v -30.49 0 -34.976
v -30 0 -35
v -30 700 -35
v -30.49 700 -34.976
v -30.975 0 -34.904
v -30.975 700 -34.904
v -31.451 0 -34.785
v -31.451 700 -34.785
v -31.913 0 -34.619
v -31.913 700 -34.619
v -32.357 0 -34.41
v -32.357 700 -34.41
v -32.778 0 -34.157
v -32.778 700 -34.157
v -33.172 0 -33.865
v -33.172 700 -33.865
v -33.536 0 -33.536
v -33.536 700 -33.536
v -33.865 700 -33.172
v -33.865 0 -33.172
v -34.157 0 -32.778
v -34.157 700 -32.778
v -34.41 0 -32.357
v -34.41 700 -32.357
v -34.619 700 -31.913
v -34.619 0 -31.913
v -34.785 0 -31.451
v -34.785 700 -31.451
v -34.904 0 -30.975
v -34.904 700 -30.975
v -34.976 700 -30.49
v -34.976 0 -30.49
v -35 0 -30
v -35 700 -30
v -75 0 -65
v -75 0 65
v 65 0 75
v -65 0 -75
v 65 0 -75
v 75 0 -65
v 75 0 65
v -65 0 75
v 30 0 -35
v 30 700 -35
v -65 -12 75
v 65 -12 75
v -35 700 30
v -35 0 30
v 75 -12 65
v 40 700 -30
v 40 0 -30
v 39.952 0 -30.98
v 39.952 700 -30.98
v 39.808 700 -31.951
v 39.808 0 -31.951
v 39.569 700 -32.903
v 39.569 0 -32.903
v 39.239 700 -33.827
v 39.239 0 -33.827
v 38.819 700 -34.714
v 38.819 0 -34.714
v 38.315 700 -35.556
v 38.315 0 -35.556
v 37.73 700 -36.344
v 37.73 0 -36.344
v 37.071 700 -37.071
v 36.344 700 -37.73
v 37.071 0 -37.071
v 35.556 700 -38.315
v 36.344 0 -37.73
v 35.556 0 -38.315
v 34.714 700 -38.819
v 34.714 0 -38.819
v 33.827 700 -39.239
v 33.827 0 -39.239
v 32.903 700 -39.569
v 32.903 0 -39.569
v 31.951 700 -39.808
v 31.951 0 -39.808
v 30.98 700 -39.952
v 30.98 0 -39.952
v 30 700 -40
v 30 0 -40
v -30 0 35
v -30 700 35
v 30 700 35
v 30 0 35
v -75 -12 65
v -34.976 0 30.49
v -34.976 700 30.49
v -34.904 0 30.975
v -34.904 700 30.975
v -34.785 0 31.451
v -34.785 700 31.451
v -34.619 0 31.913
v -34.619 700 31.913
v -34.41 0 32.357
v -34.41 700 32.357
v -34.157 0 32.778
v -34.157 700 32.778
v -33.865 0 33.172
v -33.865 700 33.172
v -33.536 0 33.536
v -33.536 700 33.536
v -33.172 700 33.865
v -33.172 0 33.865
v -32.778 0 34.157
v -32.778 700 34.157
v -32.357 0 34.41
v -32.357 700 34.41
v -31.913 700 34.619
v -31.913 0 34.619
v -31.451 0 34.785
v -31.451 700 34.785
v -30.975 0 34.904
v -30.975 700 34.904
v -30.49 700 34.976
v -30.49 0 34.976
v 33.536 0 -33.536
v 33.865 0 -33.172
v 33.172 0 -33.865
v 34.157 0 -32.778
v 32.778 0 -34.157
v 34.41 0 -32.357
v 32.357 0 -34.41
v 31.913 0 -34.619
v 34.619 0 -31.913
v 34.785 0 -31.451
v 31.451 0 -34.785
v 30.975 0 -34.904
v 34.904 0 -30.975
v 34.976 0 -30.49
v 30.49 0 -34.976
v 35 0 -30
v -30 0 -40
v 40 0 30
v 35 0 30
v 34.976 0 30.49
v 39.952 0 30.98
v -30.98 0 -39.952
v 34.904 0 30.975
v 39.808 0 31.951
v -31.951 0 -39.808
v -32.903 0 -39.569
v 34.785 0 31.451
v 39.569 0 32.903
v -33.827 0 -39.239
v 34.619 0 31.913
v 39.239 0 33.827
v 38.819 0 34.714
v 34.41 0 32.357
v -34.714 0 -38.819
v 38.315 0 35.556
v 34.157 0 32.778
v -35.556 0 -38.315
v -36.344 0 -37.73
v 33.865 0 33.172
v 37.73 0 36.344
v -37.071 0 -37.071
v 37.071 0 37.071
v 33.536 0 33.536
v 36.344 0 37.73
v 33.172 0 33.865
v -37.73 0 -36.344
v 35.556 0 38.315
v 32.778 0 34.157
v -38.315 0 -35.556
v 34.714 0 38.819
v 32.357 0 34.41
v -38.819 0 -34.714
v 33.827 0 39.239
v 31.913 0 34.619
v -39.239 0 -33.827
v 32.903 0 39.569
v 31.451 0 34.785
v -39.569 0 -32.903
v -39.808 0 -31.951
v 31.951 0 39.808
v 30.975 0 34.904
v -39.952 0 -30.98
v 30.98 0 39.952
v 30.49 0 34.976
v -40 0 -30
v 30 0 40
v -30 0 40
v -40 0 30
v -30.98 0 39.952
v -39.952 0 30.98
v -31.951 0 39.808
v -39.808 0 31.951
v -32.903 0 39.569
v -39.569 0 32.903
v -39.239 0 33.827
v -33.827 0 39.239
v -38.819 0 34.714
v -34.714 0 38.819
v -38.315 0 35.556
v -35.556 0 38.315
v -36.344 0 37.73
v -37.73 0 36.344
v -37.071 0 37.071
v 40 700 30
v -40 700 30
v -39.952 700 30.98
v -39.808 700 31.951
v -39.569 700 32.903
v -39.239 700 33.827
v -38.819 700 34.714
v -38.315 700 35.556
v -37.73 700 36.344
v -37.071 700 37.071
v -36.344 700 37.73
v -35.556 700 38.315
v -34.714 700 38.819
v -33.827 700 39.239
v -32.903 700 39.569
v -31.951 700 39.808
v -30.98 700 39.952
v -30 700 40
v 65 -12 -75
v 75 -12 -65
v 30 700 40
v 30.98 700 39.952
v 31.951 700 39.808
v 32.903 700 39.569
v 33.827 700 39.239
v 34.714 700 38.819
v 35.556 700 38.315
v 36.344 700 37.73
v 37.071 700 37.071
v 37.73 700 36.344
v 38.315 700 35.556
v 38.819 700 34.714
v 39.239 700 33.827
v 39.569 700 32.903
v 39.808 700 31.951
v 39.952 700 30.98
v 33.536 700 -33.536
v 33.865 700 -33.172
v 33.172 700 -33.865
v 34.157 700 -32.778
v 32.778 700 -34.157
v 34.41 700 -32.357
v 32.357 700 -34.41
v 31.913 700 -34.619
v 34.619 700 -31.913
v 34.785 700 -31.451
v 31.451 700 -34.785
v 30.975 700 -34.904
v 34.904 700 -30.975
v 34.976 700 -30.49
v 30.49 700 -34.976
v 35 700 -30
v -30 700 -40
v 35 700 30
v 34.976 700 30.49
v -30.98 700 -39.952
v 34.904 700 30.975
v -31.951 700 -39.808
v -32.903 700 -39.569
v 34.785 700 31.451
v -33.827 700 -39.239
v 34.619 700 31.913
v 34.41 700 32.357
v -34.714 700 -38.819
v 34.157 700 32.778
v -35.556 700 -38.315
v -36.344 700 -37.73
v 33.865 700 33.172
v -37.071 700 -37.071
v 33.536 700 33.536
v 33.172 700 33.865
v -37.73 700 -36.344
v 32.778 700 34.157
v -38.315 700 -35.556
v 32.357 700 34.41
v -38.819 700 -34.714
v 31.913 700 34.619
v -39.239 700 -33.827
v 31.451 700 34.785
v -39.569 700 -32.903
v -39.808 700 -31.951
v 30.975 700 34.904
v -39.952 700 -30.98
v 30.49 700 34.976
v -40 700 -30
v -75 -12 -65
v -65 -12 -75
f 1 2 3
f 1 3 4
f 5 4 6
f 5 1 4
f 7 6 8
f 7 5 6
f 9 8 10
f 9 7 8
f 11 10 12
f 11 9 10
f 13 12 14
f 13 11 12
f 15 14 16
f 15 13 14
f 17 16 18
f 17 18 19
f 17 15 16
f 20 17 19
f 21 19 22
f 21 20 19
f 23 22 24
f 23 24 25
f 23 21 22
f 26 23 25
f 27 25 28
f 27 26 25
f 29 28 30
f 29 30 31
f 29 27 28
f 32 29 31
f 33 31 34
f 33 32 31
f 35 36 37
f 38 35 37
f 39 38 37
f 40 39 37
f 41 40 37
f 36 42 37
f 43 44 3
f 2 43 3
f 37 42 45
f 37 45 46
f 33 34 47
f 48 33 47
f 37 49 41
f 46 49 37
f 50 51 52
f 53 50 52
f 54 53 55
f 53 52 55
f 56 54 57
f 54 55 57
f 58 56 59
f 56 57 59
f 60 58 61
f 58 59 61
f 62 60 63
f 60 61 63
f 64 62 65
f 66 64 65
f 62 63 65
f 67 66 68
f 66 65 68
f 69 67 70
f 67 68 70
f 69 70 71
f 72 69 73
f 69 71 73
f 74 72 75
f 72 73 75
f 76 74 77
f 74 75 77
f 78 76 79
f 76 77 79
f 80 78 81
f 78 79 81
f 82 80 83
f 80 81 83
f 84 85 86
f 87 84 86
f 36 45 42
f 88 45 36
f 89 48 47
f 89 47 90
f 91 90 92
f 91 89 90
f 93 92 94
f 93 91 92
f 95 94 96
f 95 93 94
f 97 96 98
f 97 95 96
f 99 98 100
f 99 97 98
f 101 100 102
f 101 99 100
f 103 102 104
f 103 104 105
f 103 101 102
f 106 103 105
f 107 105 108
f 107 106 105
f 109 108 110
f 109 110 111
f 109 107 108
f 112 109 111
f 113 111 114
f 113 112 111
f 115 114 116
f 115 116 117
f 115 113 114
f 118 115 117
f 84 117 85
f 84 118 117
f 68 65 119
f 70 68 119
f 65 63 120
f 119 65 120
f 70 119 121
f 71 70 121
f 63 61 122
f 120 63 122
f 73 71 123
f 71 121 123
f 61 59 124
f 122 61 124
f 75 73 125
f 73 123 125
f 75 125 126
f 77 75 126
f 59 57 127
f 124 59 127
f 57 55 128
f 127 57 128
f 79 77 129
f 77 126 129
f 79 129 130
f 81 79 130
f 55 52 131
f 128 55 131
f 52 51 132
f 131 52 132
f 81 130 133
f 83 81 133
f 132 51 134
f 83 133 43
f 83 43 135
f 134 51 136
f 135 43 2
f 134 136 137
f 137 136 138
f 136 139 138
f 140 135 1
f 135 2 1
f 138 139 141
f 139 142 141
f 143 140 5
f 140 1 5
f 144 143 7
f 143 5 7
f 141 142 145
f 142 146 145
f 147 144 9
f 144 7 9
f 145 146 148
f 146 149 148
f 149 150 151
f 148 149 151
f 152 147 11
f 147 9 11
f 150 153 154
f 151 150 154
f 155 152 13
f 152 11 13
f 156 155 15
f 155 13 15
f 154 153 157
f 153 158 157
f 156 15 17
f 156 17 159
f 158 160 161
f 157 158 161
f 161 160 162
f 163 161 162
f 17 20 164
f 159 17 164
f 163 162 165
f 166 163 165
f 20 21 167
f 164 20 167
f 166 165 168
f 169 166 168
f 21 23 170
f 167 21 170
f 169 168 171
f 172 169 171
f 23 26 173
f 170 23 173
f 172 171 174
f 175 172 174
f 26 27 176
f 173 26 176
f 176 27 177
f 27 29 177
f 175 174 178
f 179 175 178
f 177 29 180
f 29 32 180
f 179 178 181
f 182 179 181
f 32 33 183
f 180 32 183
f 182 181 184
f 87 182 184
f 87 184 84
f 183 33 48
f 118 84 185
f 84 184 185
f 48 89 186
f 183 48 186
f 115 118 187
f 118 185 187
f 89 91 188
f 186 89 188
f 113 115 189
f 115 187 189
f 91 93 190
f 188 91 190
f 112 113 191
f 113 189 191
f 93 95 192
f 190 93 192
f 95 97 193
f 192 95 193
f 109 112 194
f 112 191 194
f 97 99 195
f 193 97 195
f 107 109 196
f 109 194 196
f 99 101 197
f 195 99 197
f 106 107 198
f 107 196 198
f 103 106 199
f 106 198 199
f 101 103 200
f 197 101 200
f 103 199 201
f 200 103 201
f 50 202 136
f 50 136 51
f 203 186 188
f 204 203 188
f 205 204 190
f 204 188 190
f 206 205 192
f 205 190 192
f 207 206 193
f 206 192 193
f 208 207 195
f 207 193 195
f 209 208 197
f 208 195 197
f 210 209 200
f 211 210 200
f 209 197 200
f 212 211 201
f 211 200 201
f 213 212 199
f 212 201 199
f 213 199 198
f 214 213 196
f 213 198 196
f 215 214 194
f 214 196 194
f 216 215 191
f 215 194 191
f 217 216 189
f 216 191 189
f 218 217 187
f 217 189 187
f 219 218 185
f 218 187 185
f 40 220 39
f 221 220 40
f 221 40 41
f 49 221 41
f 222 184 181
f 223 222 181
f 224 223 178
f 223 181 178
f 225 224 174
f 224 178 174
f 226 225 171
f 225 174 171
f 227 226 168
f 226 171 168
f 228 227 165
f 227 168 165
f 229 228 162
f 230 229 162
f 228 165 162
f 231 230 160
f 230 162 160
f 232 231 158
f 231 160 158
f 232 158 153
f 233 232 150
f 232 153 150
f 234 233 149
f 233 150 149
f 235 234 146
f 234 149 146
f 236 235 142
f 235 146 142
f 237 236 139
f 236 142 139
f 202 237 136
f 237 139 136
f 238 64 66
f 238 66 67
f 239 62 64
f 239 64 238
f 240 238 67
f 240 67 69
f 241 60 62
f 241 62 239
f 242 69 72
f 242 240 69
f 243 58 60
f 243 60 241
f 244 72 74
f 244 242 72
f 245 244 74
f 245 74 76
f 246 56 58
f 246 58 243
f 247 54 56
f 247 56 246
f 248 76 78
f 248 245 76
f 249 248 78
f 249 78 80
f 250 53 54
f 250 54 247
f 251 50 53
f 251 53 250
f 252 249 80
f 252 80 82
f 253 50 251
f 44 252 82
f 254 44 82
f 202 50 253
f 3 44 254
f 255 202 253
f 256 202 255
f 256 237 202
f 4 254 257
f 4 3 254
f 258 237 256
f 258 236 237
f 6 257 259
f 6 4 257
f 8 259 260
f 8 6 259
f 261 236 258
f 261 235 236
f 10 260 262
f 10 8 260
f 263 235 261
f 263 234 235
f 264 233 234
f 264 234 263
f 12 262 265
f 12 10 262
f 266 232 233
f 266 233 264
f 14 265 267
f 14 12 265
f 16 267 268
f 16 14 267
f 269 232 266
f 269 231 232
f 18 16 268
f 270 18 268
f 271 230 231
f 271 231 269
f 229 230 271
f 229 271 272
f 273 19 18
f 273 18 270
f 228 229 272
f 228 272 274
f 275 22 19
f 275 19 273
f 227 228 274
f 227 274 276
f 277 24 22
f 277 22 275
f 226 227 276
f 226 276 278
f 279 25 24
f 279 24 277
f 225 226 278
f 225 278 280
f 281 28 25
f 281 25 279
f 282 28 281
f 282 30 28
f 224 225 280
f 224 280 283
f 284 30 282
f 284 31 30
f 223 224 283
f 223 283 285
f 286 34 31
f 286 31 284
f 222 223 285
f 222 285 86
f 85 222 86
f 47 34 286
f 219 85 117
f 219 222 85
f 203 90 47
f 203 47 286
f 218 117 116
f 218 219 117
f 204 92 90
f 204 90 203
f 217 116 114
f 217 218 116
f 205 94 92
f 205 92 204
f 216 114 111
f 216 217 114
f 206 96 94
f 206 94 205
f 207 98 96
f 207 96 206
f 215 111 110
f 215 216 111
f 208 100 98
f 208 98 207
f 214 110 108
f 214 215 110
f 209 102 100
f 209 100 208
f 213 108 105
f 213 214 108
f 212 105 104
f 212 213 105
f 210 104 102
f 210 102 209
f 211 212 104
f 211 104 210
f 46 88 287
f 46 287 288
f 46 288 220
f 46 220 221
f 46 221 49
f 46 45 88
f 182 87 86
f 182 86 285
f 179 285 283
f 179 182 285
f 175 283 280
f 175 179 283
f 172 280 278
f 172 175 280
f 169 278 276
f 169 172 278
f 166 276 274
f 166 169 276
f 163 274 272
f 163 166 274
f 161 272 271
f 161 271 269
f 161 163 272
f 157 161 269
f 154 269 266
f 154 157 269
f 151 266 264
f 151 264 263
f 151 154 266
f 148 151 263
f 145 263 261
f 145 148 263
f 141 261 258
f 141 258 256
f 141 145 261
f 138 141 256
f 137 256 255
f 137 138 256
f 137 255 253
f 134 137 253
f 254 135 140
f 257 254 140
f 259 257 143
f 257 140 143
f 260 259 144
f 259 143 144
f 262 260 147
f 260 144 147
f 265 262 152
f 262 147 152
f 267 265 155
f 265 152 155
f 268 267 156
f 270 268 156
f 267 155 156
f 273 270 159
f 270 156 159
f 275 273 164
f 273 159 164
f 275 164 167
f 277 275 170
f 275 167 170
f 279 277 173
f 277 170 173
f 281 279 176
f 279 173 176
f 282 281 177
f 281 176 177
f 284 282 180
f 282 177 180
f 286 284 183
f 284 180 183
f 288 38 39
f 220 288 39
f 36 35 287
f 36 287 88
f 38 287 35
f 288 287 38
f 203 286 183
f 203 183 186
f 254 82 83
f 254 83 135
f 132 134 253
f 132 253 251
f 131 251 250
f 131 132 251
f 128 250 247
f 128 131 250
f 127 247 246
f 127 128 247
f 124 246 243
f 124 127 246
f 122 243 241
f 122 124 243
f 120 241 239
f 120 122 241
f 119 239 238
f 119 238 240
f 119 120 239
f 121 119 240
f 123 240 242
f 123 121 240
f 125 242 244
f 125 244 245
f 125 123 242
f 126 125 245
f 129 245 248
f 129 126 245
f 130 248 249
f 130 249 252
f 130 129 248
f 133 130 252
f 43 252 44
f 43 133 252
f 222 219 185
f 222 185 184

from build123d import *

# Parameters (mm, degrees)
SQUARE_TUBE_80_X_80_X_5_1_DEPTH = 700
SKETCH12_W                      = 150
SKETCH12_H                      = 150
BASE_FLANGE1_DEPTH              = 12
BREAK_CORNER1_START             = -12
BREAK_CORNER1_DEPTH             = 12


# Read off the part's stored shape, not the designer's step: Break-Corner1
# Sheet-metal steps are written as plain solids
with BuildPart() as part:
    # Sketch11 → Square tube 80 X 80 X 5(1) (new body)
    with BuildSketch(Plane(origin=(0, 0, 0), x_dir=(-1, 0, 0), z_dir=(0, 1, 0))):
        with BuildLine():
            Line((-30, -40), (30, -40))
            ThreePointArc((30, -40), (37.071067812, -37.071067812), (40, -30))
            Line((40, -30), (40, 30))
            ThreePointArc((40, 30), (37.071067812, 37.071067812), (30, 40))
            Line((30, 40), (-30, 40))
            ThreePointArc((-30, 40), (-37.071067812, 37.071067812), (-40, 30))
            Line((-40, 30), (-40, -30))
            ThreePointArc((-40, -30), (-37.071067812, -37.071067812), (-30, -40))
        make_face()
        with BuildLine():
            Line((-30, -35), (30, -35))
            ThreePointArc((30, -35), (33.535533906, -33.535533906), (35, -30))
            Line((35, -30), (35, 30))
            ThreePointArc((35, 30), (33.535533906, 33.535533906), (30, 35))
            Line((30, 35), (-30, 35))
            ThreePointArc((-30, 35), (-33.535533906, 33.535533906), (-35, 30))
            Line((-35, 30), (-35, -30))
            ThreePointArc((-35, -30), (-33.535533906, -33.535533906), (-30, -35))
        make_face(mode=Mode.SUBTRACT)
    extrude(amount=SQUARE_TUBE_80_X_80_X_5_1_DEPTH)


with BuildPart() as body_2:
    # Sketch12 → Base-Flange1 (new body)
    with BuildSketch(Plane.XZ):
        Rectangle(SKETCH12_W, SKETCH12_H)
    extrude(amount=BASE_FLANGE1_DEPTH)

    # Break-Corner1 outline → Break-Corner1 (cut)
    with BuildSketch(Plane(origin=(0, 0, 0), x_dir=(1, 0, 0), z_dir=(0, 1, 0)).offset(BREAK_CORNER1_START)):
        Polygon((75, -75), (75, -65), (65, -75), align=None)
        Polygon((65, 75), (75, 65), (75, 75), align=None)
        Polygon((-75, -75), (-65, -75), (-75, -65), align=None)
        Polygon((-75, 65), (-65, 75), (-75, 75), align=None)
    extrude(amount=BREAK_CORNER1_DEPTH, mode=Mode.SUBTRACT)


solid = Compound([part.part, body_2.part])
